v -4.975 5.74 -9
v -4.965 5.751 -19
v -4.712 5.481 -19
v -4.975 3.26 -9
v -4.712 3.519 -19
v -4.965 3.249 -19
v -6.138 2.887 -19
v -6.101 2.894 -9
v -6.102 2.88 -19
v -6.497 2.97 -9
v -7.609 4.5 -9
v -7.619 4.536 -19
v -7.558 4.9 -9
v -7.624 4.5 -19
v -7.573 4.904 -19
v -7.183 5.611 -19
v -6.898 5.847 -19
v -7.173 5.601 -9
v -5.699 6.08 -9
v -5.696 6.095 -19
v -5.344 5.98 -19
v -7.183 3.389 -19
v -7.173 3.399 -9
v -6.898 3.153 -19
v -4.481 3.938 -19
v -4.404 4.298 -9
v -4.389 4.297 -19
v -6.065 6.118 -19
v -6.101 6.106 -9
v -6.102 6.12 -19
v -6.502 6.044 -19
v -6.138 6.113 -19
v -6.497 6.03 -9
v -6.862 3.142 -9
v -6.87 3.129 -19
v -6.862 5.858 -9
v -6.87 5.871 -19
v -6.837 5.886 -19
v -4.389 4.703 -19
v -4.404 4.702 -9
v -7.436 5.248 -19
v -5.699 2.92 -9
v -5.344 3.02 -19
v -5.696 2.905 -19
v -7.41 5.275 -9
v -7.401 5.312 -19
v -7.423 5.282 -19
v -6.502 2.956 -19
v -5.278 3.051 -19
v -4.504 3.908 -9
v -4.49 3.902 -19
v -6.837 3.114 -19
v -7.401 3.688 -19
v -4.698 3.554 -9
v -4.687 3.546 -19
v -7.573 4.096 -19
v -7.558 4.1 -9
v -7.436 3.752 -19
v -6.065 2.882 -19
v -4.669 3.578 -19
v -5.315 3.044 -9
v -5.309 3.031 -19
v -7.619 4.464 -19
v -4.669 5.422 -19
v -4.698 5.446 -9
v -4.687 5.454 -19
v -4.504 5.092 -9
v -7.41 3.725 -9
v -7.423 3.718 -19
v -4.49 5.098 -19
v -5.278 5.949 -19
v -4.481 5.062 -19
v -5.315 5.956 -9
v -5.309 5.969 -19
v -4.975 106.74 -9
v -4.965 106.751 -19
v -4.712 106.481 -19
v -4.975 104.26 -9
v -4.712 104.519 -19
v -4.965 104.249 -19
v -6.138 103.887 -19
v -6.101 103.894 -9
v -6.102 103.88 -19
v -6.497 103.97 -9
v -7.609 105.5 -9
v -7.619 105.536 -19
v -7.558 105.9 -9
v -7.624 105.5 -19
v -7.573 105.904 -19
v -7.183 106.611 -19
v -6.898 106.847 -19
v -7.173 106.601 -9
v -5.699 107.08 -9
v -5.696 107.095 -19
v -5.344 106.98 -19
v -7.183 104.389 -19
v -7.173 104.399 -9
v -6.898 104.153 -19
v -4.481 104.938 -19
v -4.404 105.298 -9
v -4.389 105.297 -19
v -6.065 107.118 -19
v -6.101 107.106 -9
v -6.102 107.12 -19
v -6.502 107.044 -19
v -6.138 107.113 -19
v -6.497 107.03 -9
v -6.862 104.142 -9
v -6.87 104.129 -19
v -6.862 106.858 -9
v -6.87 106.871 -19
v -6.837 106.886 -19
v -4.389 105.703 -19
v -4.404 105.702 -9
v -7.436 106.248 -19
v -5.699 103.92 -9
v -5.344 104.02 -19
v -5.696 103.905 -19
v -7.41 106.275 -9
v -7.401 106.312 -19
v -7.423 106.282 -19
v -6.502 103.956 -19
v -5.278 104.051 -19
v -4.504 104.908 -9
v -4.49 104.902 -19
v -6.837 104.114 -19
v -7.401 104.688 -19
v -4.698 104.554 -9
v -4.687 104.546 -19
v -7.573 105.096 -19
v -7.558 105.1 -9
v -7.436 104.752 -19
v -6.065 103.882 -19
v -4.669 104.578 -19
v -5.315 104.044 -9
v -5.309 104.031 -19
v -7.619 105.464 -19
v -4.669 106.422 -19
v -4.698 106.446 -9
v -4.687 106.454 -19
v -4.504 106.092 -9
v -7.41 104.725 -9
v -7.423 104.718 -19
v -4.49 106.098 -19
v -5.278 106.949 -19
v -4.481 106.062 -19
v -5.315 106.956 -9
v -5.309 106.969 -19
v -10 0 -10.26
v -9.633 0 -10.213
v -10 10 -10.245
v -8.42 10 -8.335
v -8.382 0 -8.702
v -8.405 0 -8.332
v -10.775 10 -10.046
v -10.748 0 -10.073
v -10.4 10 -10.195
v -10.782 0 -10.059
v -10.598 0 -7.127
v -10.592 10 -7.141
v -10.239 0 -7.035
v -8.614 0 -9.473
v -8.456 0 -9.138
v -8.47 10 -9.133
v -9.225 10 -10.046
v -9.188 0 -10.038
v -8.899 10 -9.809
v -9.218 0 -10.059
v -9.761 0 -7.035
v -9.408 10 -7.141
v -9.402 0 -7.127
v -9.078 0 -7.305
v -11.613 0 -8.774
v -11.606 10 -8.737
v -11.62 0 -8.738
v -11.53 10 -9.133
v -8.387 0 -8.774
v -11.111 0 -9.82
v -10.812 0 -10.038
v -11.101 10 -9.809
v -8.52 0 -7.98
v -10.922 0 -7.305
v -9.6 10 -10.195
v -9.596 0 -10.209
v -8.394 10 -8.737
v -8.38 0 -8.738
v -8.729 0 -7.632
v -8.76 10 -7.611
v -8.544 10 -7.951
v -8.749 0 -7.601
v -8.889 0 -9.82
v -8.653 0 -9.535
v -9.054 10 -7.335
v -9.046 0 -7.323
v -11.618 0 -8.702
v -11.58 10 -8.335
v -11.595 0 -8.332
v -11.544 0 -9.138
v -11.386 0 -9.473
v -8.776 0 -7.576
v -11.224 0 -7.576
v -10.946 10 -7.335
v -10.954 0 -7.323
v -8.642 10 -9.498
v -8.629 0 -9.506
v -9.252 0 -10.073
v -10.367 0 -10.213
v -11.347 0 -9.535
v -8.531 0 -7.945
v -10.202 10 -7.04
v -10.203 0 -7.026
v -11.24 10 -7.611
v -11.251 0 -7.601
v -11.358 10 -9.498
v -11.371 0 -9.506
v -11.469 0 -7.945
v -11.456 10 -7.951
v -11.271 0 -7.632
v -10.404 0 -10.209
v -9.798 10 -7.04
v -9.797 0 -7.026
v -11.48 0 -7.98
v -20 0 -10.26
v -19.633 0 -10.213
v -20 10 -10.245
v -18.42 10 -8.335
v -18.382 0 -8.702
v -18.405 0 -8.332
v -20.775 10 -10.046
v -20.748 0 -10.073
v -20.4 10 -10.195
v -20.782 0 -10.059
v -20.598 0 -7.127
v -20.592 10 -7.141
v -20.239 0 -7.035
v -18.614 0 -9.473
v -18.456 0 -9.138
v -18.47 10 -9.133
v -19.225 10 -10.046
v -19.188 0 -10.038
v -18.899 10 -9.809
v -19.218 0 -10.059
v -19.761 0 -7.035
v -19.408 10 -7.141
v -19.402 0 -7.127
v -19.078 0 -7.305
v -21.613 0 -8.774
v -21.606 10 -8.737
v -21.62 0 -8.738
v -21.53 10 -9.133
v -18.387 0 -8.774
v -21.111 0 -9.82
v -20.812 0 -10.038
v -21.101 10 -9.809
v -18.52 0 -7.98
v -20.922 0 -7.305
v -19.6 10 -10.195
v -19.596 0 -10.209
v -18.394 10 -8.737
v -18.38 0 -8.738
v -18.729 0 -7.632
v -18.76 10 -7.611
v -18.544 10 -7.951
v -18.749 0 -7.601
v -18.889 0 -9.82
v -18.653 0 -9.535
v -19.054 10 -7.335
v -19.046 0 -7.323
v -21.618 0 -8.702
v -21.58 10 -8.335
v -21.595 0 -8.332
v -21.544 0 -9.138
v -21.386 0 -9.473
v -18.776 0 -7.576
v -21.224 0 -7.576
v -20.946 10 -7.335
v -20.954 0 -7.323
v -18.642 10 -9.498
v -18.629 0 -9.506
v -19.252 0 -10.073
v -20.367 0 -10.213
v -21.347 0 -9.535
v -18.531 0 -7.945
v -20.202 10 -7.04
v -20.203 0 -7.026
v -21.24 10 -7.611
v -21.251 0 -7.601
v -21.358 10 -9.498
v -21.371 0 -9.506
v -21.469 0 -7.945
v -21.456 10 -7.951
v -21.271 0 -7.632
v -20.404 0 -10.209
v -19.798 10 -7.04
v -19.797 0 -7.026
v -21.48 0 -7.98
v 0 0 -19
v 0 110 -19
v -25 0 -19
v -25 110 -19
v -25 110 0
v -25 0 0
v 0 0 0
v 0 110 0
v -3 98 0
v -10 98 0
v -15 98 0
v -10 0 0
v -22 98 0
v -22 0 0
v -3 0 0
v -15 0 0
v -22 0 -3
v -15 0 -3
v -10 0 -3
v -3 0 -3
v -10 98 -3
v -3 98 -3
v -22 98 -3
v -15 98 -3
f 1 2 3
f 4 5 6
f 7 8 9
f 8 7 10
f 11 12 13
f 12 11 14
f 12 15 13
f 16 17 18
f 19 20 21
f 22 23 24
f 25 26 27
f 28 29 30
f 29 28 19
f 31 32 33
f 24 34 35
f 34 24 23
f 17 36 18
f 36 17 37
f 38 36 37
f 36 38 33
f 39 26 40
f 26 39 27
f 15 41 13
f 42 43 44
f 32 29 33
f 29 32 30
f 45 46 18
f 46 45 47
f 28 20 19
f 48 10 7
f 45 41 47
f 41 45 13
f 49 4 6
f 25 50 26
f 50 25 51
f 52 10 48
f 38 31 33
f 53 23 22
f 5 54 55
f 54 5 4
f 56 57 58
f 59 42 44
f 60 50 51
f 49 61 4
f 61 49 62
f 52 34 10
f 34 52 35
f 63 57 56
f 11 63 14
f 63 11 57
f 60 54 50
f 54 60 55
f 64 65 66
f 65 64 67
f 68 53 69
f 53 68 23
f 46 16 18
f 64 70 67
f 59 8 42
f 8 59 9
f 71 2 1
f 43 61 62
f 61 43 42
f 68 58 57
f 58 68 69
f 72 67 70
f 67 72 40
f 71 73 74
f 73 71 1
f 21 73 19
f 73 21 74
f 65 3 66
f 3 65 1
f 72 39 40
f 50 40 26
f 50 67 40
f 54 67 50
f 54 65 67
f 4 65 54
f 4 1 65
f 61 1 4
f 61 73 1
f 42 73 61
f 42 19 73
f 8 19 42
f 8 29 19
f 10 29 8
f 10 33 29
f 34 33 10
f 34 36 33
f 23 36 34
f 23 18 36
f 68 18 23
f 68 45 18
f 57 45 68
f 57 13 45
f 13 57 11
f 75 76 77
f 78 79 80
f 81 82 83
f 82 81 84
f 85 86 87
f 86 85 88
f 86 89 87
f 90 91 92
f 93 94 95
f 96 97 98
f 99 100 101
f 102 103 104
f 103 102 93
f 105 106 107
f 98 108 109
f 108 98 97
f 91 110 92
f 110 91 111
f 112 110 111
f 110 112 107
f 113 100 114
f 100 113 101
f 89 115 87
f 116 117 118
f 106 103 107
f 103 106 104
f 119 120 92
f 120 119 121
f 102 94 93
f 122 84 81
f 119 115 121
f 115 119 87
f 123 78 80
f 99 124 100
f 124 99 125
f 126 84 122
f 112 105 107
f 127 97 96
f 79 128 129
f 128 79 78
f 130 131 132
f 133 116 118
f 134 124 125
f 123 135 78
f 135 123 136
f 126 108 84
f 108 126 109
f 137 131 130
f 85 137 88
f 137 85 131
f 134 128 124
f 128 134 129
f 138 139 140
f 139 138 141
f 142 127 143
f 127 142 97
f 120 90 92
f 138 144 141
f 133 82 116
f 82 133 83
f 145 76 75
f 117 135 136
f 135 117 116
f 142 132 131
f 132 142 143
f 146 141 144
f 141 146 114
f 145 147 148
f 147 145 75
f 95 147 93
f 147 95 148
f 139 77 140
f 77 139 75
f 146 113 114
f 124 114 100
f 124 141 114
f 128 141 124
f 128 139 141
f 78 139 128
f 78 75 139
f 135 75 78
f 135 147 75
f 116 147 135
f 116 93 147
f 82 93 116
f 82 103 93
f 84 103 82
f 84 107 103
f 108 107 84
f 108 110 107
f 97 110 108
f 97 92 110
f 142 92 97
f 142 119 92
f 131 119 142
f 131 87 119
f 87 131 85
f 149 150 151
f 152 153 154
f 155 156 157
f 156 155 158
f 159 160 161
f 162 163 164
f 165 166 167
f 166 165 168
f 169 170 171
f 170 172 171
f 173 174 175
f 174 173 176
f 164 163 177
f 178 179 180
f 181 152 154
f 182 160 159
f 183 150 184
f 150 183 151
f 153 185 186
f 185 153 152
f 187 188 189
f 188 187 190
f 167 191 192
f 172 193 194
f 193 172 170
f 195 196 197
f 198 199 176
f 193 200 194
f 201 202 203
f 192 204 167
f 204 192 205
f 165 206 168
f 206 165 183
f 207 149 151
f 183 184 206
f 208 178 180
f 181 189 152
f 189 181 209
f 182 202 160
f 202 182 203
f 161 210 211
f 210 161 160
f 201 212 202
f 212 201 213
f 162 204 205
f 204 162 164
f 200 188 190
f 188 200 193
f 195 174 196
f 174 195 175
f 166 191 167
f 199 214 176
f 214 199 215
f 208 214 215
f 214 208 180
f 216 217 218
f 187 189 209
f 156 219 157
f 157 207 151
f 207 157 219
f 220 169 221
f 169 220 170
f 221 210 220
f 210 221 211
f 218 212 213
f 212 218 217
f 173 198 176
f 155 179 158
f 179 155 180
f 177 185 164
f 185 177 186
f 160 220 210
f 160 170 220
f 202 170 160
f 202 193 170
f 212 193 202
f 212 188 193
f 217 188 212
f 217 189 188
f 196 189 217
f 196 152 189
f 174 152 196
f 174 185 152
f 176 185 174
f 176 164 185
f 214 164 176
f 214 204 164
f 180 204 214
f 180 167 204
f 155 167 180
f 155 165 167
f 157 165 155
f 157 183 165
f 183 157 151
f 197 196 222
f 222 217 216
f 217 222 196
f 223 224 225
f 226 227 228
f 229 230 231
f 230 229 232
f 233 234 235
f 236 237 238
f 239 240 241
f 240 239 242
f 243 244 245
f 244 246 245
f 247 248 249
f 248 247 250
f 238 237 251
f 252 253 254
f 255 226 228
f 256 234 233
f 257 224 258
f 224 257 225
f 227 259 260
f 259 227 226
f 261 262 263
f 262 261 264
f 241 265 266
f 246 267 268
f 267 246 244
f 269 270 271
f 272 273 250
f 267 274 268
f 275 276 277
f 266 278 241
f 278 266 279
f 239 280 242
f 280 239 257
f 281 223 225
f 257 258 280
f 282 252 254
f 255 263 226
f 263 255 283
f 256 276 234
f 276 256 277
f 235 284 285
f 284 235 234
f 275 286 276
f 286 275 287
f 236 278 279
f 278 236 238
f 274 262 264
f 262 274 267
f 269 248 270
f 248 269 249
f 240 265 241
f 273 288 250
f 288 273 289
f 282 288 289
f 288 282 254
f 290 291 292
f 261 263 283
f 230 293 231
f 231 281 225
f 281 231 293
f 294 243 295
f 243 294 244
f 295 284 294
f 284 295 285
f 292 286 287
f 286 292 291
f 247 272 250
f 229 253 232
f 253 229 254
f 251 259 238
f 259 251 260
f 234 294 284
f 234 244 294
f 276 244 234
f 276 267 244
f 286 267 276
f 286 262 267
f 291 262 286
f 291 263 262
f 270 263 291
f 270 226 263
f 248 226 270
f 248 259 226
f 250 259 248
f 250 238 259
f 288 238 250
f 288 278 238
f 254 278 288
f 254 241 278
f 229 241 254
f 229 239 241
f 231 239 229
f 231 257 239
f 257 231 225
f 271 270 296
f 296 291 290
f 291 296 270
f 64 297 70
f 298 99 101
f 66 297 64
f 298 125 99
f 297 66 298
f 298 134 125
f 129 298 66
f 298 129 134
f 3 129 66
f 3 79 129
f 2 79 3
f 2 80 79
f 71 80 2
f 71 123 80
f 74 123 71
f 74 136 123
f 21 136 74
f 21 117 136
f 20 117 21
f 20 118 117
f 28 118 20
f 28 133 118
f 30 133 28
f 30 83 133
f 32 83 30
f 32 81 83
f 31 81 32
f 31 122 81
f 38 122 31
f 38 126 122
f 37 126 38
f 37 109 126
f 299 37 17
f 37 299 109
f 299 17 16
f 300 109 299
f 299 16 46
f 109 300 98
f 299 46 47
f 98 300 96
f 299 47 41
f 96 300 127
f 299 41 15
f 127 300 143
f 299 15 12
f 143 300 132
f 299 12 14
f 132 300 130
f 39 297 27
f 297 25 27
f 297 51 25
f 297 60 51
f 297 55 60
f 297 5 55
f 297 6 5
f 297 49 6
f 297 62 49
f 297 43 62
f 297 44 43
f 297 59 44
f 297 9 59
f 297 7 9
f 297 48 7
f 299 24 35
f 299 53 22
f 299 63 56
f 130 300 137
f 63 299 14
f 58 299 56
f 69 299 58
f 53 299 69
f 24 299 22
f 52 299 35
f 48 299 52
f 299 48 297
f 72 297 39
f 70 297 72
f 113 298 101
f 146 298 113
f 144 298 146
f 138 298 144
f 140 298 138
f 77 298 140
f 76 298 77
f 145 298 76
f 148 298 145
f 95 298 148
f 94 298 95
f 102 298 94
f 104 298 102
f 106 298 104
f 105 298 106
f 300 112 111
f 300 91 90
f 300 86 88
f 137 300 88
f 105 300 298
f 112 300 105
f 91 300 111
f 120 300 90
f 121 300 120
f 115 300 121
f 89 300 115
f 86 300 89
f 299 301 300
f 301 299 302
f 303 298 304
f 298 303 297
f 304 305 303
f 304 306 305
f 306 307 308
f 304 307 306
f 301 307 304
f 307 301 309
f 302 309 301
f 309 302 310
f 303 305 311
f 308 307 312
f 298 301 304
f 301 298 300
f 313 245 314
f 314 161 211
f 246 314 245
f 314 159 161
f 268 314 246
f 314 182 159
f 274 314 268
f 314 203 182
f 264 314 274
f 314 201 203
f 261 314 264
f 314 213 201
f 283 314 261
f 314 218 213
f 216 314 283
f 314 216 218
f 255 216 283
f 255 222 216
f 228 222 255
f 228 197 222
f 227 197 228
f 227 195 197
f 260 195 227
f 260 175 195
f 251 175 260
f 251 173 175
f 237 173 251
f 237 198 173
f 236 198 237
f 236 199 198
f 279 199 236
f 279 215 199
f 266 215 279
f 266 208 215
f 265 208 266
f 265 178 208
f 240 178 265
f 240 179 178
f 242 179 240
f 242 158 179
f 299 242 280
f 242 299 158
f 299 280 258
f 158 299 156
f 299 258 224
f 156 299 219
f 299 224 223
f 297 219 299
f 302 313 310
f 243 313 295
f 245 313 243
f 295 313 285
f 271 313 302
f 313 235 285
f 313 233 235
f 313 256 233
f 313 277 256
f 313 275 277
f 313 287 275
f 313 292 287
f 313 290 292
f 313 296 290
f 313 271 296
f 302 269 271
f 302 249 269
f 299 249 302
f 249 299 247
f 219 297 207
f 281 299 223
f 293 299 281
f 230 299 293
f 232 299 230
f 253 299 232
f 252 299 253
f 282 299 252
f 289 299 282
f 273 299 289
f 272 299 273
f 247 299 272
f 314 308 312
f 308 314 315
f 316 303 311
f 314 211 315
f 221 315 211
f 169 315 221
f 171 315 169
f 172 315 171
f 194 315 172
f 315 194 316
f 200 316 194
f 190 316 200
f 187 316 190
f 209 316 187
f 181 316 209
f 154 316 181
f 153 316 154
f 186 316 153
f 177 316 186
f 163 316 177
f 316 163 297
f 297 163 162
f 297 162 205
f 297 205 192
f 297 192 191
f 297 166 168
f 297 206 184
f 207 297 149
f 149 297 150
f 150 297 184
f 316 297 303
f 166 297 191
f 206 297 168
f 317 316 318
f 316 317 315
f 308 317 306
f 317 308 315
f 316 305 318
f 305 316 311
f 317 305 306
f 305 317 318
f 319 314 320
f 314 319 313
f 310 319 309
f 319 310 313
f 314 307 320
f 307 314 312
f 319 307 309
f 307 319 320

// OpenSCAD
// file: variables.scad
/* [Bracket Dimensions] */
BracketLength = 110;
BracketHeight = 25;
BracketWidth = 19;

/* [3.5" Mounting Holes] */
MountingHolesDiameter = 3.25;
MountingHolesDepth = 10;
MountingHolesDistance = 101;
MountingHolesDistanceBottom = 6;
// in percent
MountingHolesTaper = 1;

/* [Sliding Lock] */
LockHolesDiameter = 3.25;
LockHolesDepth = 10;
LockHolesDistance = 10;
// in percent
LockHolesTaper = 1;
// main file
/*
    Parametric Dual M.2 / SSD to 3.5" Adapter
        * You need to export one bracket per side
    
    Source: https://github.com/KaiserSoft/3D-Printing/tree/master/Dual%20M2%20%20or%202.5%20SSD%20Mounting%20Adapter
    
    License: CC0 1.0 Universal (CC0 1.0) Public Domain Dedication
    Designed: 2019 by Mirko Kaiser in Stuttgart, Germany
*/

/* [User Config Options] */
// You need one bracket for each side
Bracket_Side = "left"; // [ left, right ]

// Thickness of the PCB or SSD
Slot1_Height = 7; // [ 1.25:1.25mm Bare PCB, 2:2mm Bare PCB, 5:5mm, 6:6mm, 7:7mm, 8:8mm, 9:9mm, 10:10mm, 11:11mm ]
// Length of PCB or SSD
Slot1_Length = 98; // [ 98:98mm Bare PCB, 101:101mm SSD ]
// Adjust the depth if your PCB has components close to the edge
Slot1_Depth = 3; // [ 1:1mm, 2:2mm, 3:3mm, 4:4mm ]

// Thickness of the PCB or SSD
Slot2_Height = 7; // [ 1.25:1.25mm Bare PCB, 2:2mm Bare PCB, 5:5mm, 6:6mm, 7:7mm, 8:8mm, 9:9mm, 10:10mm, 11:11mm ]
// Length of PCB or SSD
Slot2_Length = 98; // [ 98:98mm Bare PCB, 101:101mm SSD ]
// Adjust the depth if your PCB has components close to the edge
Slot2_Depth = 3; // [ 1:1mm, 2:2mm, 3:3mm, 4:4mm ]
// Ad mounting holes for the locking plate
Lock_Plate = 1; // [0:no, 1:yes]



include <variables.scad>;
/* variables end */





/* needs one for each side */
if( Bracket_Side == "left" ) {
    mirror( [1, 0 ,0] ) mountingBlock();
}else{
    mountingBlock();
}



/* the entire mounting block */
module mountingBlock(){
    rotate( [0, 90, 0 ] ){ //proper rotation for printing
        difference(){
            /* main Bracket */
            cube( [ BracketWidth, BracketLength, BracketHeight] , false);


            /* bottom slot */
            if( Slot1_Height < 10 ){
                makeSlot( 3, Slot1_Height, Slot1_Depth, Slot1_Length );
            }else if( Slot1_Height == 10 ){
                makeSlot( 2, Slot1_Height, Slot1_Depth, Slot1_Length );
            }else{
                makeSlot( 1, Slot1_Height, Slot1_Depth, Slot1_Length );
            }


            /* top slot */
            if( Slot2_Height < 5 ){
                distance = BracketHeight-7-3;
                makeSlot( distance, Slot2_Height, Slot2_Depth, Slot2_Length );
            }else if( Slot2_Height < 10 ){
                distance = BracketHeight-Slot2_Height-3;
                makeSlot( distance, Slot2_Height, Slot2_Depth, Slot2_Length );
            }else if( Slot2_Height == 10 ){
                distance = BracketHeight-Slot2_Height-2;
                makeSlot( distance, Slot2_Height, Slot2_Depth, Slot2_Length );
            }else{
                distance = BracketHeight-Slot2_Height-1;
                makeSlot( distance, Slot2_Height, Slot2_Depth, Slot2_Length );
            }
            

            /* 3.5" mounting holes */
            m3Holes();

            /* lock slider mounting holes */
           if( Lock_Plate == 1 ){
            lockSlider();
           }
        }
    }
}



/* lock slider mount */
module lockSlider(){
    for( x=[0:1] ){
       translate([ BracketWidth/2.2, -1, LockHolesDistance + LockHolesDistance * x]) { 
            rotate( [-90, 0, 0] ){
        color ("red") cylinder( $fn=25, 1+LockHolesDepth, d1=LockHolesDiameter, d2=LockHolesDiameter-LockHolesDiameter*(LockHolesTaper/100),false);
            }
        }
    }
}


/* 3.5" mounting holes */
module m3Holes(){
    for( x=[0:1] ){
        translate( [BracketWidth+1,((BracketLength-MountingHolesDistance)/2)+(x*MountingHolesDistance),MountingHolesDistanceBottom]){
            rotate( [0, -90, 0] ){
                color ("blue") cylinder($fn=25, 1+MountingHolesDepth, d1=MountingHolesDiameter, d2=MountingHolesDiameter-MountingHolesDiameter*(MountingHolesTaper/100),false);
            }
        }
    }
}


/* creates a single slot */
module makeSlot( Distance2Bottom, SlotHeight, SlotDepth, SlotLength ){
    translate([ -1, -1, Distance2Bottom]) {
        color ("purple") cube( [ 1+SlotDepth, 1+SlotLength, SlotHeight], false);
    }
}
